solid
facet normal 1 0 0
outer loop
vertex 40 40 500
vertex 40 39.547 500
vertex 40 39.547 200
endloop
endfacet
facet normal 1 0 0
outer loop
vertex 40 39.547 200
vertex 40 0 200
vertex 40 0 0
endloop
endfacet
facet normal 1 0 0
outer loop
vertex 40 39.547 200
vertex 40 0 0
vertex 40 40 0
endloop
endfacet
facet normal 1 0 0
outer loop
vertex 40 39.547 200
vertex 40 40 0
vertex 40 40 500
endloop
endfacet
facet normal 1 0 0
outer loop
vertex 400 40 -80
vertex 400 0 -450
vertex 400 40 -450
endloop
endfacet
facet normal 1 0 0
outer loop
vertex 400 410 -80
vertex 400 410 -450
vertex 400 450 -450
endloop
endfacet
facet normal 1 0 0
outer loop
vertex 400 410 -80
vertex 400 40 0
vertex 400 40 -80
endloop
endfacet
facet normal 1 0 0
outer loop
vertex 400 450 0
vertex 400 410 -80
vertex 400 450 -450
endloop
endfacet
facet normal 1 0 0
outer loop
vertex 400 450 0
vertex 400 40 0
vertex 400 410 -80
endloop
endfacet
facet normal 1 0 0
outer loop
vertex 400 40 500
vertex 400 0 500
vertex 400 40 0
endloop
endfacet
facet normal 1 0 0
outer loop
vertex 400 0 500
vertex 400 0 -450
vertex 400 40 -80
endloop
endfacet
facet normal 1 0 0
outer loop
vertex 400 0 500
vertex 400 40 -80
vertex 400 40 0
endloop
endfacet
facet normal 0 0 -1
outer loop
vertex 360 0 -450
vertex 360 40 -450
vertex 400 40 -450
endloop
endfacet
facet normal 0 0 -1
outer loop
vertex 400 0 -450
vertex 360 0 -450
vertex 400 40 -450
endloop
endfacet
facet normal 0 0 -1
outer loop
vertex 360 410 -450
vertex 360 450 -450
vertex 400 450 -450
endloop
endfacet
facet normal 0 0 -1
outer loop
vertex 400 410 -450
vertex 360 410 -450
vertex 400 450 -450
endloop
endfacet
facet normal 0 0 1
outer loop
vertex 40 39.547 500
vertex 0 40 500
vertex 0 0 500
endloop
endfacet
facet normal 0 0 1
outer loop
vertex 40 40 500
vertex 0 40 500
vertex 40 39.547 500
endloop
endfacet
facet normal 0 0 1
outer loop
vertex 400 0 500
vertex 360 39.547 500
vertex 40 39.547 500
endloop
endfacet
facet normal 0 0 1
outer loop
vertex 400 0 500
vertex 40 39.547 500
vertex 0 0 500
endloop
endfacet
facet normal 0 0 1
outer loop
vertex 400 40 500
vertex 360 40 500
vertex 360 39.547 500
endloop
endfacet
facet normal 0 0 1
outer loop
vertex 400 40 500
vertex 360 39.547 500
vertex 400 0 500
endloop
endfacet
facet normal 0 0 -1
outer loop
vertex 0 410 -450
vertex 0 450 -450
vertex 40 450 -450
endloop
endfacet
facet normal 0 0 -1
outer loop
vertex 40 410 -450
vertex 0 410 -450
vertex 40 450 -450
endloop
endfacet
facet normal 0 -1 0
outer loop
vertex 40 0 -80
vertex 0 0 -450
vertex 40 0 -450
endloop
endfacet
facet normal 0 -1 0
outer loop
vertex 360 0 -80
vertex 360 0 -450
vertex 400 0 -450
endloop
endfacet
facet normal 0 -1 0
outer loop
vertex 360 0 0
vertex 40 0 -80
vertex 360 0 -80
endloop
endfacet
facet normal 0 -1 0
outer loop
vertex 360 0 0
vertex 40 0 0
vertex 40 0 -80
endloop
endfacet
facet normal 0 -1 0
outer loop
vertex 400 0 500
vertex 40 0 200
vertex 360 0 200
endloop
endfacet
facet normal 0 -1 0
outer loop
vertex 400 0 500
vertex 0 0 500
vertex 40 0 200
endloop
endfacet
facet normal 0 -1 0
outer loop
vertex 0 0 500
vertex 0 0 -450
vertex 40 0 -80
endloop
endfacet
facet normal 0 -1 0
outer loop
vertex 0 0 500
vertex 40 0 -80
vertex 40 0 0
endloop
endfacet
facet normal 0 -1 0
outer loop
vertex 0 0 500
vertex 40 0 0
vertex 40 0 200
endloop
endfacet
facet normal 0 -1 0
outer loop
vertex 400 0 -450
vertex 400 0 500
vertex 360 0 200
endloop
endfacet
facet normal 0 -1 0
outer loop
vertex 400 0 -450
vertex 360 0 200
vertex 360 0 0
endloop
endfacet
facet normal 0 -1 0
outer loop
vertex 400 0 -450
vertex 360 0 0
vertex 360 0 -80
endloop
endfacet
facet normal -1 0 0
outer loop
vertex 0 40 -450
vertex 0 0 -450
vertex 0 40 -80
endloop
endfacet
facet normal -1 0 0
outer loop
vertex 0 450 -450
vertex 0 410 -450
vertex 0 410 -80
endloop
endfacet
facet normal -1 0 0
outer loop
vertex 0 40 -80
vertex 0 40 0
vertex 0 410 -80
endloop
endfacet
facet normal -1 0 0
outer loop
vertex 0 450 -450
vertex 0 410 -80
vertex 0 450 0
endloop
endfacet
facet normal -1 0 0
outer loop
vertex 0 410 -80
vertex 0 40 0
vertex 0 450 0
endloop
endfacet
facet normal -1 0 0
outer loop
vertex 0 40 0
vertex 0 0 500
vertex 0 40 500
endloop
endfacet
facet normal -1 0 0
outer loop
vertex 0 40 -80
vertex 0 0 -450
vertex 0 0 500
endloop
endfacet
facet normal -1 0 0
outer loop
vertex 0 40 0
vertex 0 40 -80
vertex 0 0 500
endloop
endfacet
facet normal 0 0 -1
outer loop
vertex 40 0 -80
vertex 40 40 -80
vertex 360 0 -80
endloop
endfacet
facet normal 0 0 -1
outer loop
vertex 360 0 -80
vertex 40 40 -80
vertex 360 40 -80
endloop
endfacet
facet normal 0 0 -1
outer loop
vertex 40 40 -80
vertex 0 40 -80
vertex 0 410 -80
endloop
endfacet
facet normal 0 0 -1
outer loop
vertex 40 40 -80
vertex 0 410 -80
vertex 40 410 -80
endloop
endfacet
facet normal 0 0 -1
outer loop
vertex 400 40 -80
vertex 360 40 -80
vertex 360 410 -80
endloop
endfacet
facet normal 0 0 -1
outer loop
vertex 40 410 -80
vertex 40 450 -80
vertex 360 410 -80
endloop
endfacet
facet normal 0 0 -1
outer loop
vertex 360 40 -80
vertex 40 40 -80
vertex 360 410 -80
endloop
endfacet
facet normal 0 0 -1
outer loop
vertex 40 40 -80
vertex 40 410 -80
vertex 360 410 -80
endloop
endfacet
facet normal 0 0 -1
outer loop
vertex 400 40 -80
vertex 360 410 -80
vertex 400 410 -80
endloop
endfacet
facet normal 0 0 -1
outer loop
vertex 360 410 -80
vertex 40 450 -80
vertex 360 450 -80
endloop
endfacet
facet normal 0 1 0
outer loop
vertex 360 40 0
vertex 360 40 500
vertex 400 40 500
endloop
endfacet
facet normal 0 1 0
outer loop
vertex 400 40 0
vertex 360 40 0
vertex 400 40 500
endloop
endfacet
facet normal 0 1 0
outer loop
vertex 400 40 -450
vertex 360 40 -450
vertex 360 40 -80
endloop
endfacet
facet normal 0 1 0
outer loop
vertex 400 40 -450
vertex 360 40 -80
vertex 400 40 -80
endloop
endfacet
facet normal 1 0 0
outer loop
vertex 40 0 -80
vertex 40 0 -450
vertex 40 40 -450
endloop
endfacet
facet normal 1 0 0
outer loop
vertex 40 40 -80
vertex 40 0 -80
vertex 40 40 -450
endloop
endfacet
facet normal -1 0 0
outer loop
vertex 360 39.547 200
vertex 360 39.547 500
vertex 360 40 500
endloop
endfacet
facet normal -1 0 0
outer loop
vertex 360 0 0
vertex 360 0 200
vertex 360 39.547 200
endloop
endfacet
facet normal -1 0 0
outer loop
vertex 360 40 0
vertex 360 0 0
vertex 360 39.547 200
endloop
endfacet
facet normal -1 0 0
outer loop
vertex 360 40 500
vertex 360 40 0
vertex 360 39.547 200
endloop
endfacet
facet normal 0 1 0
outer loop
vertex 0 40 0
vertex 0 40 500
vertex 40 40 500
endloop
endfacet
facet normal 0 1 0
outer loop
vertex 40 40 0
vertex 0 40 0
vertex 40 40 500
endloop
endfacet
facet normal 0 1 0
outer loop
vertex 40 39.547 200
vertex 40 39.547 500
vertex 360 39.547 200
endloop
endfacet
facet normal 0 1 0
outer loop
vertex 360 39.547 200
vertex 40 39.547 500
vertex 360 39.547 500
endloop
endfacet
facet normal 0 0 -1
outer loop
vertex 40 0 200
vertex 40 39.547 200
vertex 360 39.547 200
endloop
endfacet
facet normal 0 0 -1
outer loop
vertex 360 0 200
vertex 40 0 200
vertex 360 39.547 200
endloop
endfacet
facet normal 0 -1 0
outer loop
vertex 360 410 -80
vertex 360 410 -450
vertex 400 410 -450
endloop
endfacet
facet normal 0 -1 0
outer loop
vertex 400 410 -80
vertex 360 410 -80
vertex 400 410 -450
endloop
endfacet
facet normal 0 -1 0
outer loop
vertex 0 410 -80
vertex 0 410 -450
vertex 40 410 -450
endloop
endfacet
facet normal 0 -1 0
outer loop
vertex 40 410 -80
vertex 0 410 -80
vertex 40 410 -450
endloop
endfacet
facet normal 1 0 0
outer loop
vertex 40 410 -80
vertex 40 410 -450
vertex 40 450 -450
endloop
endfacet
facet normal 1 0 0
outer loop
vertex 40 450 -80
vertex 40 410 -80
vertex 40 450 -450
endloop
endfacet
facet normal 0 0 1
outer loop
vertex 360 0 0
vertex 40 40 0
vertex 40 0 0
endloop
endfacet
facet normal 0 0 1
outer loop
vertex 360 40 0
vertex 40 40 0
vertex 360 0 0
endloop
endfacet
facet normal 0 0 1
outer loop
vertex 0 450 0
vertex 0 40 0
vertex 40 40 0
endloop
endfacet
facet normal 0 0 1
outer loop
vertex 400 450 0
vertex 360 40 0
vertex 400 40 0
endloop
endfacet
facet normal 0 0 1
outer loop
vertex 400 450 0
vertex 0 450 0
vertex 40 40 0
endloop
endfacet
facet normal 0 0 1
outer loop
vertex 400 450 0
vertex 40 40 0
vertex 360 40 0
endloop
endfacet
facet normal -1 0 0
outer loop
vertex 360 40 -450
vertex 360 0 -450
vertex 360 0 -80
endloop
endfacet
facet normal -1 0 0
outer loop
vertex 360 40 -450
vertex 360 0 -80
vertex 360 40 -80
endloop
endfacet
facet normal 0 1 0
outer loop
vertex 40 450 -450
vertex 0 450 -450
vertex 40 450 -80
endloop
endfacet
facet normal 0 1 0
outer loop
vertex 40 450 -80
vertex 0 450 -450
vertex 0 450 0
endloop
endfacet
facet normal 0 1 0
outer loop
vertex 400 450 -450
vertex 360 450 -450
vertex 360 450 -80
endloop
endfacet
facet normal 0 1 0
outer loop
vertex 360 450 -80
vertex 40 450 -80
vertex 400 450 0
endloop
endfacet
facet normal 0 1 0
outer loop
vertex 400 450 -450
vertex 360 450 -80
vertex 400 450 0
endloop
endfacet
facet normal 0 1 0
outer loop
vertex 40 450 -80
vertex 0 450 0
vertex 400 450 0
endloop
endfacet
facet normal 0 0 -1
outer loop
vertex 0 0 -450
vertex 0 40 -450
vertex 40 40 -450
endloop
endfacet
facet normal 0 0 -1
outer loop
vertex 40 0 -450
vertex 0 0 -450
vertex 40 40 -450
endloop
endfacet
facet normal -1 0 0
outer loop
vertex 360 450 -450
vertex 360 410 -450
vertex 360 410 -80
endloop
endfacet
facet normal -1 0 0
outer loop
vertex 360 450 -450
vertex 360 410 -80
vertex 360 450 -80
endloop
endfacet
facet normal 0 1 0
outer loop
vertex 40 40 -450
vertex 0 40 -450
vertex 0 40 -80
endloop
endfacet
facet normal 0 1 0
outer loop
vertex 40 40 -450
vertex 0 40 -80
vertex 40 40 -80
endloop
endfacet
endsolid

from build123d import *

# Parameters (mm, degrees)
F0_W     = 400
F0_H     = 450
F1_DEPTH = 80
F2_W     = 40
F2_H     = 40
F3_DEPTH = 500
F4_DEPTH = 450
F5_W     = 360
F5_H     = 39.547034
F6_DEPTH = 300


with BuildPart() as f1:
    # F0 (on Top) → F1 (new body)
    with BuildSketch(Plane.XY):
        with Locations((200, 225)):
            Rectangle(F0_W, F0_H)
    extrude(amount=-F1_DEPTH)

    # F2 (on face) → F3 (join)
    with BuildSketch(Plane.XY):
        with Locations((20, 20)):
            Rectangle(F2_W, F2_H)
        with Locations((380, 20)):
            Rectangle(F2_W, F2_H)
    extrude(amount=F3_DEPTH)

    # F2 (on face) → F4 (join)
    with BuildSketch(Plane.XY):
        with Locations((20, 20)):
            Rectangle(F2_W, F2_H)
        with Locations((380, 20)):
            Rectangle(F2_W, F2_H)
        with Locations((380, 430)):
            Rectangle(F2_W, F2_H)
        with Locations((20, 430)):
            Rectangle(F2_W, F2_H)
    extrude(amount=-F4_DEPTH)

    # F5 (on face) → F6 (join)
    with BuildSketch(Plane.XY.offset(500)):
        with Locations((220, 19.773517)):
            Rectangle(F5_W, F5_H)
    extrude(amount=-F6_DEPTH)


solid = f1.part
